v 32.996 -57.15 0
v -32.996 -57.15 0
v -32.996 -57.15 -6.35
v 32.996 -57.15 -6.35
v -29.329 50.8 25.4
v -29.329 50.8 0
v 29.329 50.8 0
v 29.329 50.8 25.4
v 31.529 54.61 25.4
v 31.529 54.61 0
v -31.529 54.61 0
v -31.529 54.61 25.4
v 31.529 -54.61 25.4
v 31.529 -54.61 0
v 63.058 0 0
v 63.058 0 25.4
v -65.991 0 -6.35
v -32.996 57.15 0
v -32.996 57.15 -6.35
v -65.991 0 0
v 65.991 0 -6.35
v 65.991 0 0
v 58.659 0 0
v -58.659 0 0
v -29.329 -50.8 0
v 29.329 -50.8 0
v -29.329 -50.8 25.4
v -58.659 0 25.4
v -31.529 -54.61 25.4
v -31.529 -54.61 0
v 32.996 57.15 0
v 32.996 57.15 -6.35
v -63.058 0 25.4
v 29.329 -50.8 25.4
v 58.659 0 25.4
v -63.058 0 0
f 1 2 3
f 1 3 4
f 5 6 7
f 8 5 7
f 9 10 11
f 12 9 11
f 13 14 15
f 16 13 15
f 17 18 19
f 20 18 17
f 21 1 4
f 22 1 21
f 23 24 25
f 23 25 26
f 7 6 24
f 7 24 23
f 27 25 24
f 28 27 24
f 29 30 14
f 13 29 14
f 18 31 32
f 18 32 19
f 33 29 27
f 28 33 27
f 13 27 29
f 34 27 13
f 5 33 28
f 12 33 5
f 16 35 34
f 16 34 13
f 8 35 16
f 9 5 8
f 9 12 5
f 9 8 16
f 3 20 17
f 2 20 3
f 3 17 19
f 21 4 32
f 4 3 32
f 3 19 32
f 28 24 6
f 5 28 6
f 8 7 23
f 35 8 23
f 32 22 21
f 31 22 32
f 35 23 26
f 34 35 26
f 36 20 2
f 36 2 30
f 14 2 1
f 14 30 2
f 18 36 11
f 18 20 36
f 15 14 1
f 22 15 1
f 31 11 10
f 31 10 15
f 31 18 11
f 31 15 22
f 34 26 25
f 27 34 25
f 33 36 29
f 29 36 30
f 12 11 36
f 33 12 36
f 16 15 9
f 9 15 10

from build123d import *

# Parameters (mm, degrees)
F1_DEPTH = 6.35
F3_DEPTH = 25.4


with BuildPart() as f1:
    # F0 (on Top) → F1 (new body)
    with BuildSketch(Plane.XY):
        Polygon((32.995568, -57.15), (65.991136, 0), (32.995568, 57.15), (-32.995568, 57.15), (-65.991136, 0), (-32.995568, -57.15), align=None)
    extrude(amount=-F1_DEPTH)

    # F2 (on Top) → F3 (join)
    with BuildSketch(Plane.XY):
        Polygon((31.529098, -54.61), (63.058196, 0), (31.529098, 54.61), (-31.529098, 54.61), (-63.058196, 0), (-31.529098, -54.61), align=None)
        Polygon((29.329394, 50.8), (58.658787, 0), (29.329394, -50.8), (-29.329394, -50.8), (-58.658787, 0), (-29.329394, 50.8), align=None, mode=Mode.SUBTRACT)
    extrude(amount=F3_DEPTH)


solid = f1.part
